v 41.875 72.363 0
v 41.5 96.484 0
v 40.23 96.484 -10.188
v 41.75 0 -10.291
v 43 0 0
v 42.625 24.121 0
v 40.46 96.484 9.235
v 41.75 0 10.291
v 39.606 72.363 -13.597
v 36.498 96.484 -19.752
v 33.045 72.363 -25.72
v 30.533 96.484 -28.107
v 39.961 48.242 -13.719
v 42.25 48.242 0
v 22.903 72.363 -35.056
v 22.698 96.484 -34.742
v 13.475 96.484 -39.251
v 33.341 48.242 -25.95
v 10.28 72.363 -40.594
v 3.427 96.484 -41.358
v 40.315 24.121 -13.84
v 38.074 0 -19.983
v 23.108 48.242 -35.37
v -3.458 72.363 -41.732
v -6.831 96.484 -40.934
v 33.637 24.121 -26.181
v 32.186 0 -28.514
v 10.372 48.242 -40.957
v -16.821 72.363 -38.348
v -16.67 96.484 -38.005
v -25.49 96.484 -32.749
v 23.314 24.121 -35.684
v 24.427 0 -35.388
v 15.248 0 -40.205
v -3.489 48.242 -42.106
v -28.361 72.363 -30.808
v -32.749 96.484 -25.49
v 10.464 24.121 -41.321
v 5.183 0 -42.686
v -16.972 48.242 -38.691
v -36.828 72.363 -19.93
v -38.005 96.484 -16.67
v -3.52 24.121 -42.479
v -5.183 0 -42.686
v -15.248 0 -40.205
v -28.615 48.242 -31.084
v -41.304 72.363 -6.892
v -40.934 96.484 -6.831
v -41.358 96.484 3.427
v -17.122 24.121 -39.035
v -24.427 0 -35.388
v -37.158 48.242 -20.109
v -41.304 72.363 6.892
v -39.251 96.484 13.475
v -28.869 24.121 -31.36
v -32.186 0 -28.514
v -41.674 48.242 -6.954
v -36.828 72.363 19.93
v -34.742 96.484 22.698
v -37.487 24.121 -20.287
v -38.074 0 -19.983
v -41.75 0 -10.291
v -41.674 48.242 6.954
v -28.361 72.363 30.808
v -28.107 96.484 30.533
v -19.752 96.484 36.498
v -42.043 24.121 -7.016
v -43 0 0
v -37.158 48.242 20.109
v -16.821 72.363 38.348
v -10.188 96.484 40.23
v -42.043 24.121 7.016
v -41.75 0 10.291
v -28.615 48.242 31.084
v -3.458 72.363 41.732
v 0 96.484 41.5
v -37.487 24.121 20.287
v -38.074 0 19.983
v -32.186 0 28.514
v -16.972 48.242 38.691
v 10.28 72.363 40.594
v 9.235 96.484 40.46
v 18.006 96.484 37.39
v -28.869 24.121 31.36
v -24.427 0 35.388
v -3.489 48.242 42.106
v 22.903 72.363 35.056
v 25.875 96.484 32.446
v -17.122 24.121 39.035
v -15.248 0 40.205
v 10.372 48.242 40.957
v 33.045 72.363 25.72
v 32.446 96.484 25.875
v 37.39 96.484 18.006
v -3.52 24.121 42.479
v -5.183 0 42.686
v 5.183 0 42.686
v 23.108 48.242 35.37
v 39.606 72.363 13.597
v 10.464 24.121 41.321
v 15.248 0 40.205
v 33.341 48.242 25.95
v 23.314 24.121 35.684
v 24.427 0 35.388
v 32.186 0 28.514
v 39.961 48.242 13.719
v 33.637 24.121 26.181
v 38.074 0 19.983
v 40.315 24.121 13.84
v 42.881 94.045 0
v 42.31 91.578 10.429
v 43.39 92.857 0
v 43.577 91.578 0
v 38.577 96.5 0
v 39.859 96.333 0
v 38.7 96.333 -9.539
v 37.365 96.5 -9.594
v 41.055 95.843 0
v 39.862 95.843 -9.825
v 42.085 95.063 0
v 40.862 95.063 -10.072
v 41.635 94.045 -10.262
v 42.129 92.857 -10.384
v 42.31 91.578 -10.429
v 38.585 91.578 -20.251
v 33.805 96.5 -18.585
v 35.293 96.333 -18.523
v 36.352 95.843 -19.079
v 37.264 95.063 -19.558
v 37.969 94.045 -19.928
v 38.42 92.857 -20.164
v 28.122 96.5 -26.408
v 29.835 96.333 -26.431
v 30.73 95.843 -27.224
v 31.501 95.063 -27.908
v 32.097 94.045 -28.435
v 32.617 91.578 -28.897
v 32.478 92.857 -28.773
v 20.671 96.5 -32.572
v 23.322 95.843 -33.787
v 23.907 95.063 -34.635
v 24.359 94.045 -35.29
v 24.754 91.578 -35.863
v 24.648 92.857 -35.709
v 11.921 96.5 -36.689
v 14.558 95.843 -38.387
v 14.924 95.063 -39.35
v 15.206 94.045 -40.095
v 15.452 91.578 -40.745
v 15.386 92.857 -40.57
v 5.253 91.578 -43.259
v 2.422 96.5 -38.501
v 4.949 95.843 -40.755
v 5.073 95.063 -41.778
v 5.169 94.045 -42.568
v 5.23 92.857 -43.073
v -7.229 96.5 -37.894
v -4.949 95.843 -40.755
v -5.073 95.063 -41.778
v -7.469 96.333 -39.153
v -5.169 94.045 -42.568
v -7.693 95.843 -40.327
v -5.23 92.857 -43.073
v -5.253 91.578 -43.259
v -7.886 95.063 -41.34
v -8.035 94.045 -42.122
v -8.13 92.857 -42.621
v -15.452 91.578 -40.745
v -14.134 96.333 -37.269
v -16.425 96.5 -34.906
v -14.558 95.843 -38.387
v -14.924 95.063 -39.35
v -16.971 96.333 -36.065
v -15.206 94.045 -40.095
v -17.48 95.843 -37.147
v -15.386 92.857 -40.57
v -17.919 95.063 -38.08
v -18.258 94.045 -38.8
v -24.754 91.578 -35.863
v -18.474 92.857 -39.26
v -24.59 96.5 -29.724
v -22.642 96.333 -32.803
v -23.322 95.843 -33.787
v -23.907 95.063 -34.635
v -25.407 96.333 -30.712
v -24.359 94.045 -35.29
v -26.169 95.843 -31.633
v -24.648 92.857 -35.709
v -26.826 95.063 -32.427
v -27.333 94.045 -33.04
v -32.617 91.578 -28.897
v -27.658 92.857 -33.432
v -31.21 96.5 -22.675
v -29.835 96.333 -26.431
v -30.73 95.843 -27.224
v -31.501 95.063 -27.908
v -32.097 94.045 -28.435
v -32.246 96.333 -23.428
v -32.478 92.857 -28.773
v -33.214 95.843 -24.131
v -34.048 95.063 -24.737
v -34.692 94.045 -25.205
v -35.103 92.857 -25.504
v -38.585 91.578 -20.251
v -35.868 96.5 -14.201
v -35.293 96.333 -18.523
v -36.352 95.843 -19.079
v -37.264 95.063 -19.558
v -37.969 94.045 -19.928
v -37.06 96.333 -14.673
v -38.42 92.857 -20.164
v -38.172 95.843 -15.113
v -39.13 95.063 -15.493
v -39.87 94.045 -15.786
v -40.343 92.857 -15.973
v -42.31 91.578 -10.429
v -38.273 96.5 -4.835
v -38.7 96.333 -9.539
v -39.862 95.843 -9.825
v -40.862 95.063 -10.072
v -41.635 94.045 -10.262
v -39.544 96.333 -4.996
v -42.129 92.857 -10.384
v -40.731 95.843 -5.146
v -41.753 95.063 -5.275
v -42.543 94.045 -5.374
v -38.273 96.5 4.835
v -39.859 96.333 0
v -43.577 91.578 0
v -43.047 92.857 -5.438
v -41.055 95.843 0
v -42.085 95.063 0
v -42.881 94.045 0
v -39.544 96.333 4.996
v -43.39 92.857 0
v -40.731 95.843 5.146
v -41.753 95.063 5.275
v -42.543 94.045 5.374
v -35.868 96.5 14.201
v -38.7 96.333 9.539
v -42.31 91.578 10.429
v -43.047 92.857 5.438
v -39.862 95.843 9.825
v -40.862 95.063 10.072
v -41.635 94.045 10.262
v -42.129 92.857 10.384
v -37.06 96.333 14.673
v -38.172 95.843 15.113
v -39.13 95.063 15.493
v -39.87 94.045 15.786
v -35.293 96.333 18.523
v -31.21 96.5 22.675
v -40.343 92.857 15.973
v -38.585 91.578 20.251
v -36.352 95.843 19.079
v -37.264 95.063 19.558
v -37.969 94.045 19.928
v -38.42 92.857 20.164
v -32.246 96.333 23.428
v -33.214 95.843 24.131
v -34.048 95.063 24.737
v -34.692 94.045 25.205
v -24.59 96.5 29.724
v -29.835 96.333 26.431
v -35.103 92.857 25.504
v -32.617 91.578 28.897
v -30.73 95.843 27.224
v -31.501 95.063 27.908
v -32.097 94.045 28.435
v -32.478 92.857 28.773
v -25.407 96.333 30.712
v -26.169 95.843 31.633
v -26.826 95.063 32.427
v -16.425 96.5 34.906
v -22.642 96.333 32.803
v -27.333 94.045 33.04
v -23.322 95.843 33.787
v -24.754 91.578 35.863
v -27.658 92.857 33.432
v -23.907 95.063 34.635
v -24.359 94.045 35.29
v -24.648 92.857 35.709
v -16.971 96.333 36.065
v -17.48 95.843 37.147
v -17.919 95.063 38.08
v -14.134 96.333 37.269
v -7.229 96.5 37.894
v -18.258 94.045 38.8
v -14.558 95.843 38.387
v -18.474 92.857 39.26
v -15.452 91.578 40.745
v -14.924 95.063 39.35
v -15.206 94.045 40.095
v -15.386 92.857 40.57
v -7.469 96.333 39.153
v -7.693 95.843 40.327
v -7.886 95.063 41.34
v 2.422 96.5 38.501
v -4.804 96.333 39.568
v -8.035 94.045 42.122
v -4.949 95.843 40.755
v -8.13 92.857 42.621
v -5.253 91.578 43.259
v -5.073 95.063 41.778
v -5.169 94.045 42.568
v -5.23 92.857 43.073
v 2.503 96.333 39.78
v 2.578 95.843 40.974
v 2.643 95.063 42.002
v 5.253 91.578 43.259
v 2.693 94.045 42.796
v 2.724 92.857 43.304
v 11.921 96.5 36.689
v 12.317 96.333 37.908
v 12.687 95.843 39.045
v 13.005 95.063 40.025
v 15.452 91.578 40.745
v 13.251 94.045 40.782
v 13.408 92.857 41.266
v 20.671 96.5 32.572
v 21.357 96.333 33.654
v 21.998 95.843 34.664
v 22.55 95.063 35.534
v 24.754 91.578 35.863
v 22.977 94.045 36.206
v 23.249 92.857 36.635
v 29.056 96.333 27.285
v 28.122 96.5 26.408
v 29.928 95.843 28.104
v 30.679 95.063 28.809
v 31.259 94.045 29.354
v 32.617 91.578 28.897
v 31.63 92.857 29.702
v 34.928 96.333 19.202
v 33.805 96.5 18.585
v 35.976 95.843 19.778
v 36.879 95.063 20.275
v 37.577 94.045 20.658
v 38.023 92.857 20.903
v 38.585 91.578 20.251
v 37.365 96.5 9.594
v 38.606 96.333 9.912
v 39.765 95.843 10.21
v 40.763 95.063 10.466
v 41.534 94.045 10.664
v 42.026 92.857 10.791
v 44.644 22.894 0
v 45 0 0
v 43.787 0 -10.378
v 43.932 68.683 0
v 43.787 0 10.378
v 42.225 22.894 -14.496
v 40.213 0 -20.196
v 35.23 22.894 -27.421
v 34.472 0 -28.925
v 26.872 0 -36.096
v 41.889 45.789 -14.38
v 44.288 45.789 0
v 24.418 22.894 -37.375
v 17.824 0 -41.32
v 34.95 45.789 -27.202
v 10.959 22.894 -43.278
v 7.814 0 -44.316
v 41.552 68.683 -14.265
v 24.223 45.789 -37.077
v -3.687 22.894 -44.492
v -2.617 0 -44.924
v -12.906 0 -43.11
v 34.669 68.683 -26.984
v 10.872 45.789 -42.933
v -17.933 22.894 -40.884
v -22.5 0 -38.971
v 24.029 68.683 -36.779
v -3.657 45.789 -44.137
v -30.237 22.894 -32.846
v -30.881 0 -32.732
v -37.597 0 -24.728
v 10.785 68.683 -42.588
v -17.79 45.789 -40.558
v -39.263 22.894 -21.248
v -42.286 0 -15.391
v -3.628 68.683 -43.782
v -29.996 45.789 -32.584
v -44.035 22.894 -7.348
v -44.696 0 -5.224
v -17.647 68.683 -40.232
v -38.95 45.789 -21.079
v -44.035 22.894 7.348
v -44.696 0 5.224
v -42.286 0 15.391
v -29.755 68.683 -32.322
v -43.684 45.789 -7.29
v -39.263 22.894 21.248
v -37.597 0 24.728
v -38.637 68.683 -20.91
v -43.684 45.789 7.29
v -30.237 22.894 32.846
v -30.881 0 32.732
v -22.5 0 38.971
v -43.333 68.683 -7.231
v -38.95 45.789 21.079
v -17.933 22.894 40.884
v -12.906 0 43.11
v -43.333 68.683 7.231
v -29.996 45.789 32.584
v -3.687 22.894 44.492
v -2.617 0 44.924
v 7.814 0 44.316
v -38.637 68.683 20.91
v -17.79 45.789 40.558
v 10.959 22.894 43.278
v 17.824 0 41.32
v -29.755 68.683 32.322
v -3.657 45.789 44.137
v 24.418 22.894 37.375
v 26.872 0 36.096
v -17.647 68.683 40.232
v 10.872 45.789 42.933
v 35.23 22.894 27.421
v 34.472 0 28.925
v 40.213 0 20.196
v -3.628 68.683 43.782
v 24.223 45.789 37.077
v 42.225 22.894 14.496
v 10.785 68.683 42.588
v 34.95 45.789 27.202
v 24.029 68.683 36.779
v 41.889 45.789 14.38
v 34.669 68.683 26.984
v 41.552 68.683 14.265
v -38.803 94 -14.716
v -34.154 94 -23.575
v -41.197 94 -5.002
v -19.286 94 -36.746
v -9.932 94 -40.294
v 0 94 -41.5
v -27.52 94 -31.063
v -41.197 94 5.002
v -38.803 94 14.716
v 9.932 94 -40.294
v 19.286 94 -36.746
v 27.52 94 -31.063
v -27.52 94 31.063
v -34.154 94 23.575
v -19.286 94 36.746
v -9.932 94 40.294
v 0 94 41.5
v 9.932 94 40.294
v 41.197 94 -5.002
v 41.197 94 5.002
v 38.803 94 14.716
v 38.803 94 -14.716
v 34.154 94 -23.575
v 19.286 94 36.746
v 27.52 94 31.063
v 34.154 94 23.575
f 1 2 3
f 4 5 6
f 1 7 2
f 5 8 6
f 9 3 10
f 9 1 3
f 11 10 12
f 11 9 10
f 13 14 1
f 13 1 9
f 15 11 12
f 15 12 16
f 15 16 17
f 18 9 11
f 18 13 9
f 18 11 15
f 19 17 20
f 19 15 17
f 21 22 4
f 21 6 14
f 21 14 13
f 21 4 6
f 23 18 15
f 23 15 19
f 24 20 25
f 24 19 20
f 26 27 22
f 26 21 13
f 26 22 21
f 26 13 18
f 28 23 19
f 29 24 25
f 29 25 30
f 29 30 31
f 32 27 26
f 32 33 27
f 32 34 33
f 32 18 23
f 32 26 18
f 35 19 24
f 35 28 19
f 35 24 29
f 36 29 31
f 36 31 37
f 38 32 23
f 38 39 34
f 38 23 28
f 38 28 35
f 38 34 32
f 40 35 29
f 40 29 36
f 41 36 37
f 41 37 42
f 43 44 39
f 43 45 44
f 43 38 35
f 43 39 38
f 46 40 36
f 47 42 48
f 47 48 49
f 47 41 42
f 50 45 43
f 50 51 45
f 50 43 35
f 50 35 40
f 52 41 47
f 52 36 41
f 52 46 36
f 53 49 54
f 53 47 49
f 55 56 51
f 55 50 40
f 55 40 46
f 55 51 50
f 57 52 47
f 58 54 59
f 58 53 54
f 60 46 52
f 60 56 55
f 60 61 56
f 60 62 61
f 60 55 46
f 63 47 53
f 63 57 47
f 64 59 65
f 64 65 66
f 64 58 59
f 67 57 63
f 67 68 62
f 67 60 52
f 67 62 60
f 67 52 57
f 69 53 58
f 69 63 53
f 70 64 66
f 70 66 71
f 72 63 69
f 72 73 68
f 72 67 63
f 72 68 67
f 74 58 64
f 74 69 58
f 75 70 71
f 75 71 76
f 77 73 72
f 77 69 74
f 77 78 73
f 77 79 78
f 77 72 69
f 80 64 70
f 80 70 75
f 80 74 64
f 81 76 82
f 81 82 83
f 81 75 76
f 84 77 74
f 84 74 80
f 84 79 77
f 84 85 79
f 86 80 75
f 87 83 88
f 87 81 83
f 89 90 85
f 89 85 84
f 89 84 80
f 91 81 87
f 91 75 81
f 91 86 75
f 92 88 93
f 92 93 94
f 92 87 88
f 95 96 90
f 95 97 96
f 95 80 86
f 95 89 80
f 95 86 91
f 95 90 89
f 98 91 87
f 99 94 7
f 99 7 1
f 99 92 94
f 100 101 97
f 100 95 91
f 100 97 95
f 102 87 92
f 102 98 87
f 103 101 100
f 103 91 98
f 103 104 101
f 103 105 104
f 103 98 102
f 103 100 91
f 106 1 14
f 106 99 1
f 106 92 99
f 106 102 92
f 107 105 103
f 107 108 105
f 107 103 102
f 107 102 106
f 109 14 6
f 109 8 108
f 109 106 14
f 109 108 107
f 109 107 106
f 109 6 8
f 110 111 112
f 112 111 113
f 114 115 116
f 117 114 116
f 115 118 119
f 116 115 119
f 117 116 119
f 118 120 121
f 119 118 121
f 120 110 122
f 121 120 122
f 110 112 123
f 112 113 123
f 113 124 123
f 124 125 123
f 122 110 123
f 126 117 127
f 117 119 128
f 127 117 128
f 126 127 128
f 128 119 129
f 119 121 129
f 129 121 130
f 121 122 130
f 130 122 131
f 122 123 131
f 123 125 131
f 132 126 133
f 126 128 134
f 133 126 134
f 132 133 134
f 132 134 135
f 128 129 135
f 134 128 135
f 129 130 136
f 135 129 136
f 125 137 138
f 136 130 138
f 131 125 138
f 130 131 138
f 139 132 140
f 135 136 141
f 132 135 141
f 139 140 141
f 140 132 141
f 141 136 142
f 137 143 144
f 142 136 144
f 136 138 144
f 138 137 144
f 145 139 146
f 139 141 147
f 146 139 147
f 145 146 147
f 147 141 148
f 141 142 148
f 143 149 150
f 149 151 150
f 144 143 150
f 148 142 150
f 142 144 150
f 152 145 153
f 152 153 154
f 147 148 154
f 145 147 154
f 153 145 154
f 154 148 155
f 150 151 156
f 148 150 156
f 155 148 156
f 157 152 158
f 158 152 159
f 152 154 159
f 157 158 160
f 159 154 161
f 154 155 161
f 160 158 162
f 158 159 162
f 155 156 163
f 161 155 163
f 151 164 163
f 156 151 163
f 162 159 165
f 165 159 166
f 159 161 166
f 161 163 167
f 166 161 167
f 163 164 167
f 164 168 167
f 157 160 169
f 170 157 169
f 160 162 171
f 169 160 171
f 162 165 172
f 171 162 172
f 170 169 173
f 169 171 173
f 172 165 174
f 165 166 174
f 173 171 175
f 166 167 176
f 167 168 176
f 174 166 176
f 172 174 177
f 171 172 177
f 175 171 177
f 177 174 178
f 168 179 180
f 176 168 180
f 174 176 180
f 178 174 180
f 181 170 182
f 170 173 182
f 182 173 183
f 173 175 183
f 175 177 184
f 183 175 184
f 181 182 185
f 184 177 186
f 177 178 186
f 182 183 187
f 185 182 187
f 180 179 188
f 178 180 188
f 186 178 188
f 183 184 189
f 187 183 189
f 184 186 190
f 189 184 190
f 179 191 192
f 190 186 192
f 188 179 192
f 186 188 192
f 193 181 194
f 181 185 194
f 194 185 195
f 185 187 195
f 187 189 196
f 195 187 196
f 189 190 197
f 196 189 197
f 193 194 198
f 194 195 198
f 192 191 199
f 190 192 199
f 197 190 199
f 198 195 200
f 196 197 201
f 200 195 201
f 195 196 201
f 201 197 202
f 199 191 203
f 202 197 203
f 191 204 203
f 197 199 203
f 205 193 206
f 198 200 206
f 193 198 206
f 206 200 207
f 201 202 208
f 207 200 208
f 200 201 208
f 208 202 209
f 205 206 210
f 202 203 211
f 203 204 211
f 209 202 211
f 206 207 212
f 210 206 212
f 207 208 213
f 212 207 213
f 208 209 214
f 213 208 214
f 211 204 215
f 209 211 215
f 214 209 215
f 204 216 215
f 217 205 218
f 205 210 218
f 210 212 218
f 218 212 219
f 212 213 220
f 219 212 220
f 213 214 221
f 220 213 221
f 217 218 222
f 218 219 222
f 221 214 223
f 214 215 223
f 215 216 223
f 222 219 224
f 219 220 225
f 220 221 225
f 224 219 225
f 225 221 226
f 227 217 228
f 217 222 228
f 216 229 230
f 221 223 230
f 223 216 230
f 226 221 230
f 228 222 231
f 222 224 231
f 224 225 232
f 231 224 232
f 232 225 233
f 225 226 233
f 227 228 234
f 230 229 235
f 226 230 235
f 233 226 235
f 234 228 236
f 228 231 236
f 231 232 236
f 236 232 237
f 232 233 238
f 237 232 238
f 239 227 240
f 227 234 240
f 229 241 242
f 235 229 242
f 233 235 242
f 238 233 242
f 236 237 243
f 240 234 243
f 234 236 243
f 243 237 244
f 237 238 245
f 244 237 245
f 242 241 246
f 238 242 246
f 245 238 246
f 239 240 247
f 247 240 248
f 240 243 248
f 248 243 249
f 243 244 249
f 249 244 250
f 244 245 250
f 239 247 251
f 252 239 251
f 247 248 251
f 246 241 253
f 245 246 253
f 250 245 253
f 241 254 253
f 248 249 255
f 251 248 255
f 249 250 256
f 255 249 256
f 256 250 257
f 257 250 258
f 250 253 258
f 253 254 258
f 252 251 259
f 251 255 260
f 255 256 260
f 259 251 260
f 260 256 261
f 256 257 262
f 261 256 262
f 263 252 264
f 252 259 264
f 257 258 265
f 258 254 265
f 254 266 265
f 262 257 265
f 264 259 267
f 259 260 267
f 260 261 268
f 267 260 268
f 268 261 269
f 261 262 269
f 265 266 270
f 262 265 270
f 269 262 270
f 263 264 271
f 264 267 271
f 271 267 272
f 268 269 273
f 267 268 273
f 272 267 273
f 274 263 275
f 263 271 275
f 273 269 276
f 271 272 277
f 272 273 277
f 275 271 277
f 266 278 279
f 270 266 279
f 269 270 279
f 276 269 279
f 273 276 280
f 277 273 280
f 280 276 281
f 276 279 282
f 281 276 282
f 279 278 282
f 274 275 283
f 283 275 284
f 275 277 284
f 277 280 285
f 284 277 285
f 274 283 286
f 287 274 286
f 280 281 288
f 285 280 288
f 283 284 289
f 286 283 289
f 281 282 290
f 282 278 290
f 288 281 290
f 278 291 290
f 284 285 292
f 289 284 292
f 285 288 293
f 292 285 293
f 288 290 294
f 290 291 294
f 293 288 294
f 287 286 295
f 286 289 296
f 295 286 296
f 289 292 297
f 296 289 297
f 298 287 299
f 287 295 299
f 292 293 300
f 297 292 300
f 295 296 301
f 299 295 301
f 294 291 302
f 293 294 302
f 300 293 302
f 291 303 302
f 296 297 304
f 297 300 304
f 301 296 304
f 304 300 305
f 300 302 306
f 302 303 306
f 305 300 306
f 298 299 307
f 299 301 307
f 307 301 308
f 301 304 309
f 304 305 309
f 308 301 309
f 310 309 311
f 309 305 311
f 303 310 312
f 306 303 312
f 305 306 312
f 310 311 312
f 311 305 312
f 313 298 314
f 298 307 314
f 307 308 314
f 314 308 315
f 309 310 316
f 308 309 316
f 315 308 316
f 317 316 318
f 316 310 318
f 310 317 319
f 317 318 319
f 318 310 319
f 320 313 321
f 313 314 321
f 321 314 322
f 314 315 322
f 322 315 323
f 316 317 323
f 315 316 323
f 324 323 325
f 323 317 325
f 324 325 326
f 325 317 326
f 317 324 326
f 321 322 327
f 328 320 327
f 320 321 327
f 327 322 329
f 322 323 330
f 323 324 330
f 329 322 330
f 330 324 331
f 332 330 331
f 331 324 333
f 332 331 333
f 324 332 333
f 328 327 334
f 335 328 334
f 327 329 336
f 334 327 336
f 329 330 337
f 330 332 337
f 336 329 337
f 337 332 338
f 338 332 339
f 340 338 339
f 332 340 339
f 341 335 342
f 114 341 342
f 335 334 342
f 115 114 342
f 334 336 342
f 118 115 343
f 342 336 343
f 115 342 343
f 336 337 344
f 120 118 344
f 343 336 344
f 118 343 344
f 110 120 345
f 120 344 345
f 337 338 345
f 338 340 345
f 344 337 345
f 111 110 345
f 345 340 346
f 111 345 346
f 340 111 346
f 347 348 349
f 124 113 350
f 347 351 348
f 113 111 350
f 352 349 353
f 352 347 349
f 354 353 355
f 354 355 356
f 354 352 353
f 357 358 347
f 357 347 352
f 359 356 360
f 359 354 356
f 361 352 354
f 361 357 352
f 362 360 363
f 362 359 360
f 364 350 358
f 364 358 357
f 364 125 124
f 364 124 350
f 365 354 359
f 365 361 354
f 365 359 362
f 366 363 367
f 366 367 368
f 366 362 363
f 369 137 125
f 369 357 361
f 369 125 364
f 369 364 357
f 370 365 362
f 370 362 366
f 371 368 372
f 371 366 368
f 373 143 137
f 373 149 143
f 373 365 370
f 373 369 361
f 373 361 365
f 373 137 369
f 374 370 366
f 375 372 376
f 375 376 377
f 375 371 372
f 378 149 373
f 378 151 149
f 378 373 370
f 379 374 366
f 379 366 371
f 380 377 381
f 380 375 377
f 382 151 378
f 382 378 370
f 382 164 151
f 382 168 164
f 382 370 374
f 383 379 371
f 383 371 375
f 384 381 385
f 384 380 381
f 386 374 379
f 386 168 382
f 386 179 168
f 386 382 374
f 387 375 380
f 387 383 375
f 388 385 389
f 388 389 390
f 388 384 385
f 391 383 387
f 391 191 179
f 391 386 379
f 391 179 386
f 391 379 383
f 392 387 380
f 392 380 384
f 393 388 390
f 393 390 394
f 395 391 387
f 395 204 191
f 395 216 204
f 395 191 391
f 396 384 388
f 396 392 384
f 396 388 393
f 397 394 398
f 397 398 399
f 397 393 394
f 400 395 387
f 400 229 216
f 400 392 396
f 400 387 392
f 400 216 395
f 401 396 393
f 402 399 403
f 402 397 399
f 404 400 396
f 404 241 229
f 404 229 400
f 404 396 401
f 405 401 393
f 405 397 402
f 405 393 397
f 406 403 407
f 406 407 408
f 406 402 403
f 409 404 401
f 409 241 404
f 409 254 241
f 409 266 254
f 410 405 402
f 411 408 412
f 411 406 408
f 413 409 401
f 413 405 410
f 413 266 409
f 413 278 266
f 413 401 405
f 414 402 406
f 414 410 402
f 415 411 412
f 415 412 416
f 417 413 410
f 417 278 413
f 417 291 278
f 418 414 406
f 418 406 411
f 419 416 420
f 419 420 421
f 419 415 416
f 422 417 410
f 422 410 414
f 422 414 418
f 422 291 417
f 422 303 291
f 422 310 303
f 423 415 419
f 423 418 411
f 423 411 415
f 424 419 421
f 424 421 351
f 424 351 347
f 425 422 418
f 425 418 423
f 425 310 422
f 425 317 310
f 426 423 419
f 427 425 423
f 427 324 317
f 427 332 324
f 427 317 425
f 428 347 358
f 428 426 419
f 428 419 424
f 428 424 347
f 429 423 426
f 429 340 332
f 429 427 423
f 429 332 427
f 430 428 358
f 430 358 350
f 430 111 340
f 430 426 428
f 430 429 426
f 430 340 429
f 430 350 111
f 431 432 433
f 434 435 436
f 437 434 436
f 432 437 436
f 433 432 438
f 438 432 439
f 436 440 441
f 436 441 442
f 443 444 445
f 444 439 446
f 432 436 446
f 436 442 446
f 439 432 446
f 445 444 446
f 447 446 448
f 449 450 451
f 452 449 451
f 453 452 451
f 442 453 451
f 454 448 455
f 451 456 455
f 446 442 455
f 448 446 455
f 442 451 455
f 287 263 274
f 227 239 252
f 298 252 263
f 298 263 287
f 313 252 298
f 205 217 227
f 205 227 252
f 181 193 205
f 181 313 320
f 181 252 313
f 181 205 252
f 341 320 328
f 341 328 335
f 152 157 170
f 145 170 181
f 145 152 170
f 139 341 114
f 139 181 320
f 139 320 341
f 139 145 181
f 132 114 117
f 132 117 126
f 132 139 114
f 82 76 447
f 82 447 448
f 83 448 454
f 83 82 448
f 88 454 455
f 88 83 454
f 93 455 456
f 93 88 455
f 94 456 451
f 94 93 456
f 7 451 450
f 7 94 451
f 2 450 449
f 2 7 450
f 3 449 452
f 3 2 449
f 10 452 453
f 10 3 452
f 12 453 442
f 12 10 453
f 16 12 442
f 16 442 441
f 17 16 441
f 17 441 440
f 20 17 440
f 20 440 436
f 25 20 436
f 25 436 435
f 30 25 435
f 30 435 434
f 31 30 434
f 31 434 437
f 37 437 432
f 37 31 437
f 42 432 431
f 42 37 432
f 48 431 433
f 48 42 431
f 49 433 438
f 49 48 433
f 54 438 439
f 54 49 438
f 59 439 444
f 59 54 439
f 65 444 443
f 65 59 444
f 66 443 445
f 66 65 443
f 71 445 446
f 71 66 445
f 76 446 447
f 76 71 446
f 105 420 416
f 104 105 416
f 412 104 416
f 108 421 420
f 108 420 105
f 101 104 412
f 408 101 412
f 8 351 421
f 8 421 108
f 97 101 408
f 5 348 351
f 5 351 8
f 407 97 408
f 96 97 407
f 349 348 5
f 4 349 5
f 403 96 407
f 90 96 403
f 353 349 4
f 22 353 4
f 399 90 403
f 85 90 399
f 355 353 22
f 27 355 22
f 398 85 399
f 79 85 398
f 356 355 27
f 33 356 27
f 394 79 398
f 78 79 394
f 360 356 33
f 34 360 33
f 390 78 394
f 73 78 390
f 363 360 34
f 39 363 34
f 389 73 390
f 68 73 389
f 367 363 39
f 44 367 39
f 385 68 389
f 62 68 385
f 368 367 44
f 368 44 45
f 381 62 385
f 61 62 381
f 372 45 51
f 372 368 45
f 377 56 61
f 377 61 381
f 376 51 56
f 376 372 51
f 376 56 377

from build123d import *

# Parameters (mm, degrees)
SKETCH3_R           = 41.5
BOSS_EXTRUDE1_DEPTH = 2.5
FILLET1_R           = 5


# Read off the part's stored shape, not the designer's step: Loft-Thin1
with BuildPart() as part:
    # Loft-Thin1 outline → Loft-Thin1 (revolve)
    with BuildSketch(Plane.XY):
        Polygon((43.5, 96.5), (41.499758397, 96.5), (42.999758397, 0), (45, 0), align=None)
    revolve(axis=Axis((0, 0, 0), (0, 1, 0)))

    # Sketch3 → Boss-Extrude1 (add)
    with BuildSketch(Plane(origin=(0, 96.5, 0), x_dir=(1, 0, 0), z_dir=(0, 1, 0))):
        with Locations(Location((0, 0, 0), (0, 0, 270))):
            Circle(SKETCH3_R)
    extrude(amount=-BOSS_EXTRUDE1_DEPTH)

    # Fillet1
    fillet1_edges = [part.edges().sort_by_distance(p)[0] for p in [
        (-43.5, 96.5, 0),
    ]]
    fillet(fillet1_edges, radius=FILLET1_R)


solid = part.part
